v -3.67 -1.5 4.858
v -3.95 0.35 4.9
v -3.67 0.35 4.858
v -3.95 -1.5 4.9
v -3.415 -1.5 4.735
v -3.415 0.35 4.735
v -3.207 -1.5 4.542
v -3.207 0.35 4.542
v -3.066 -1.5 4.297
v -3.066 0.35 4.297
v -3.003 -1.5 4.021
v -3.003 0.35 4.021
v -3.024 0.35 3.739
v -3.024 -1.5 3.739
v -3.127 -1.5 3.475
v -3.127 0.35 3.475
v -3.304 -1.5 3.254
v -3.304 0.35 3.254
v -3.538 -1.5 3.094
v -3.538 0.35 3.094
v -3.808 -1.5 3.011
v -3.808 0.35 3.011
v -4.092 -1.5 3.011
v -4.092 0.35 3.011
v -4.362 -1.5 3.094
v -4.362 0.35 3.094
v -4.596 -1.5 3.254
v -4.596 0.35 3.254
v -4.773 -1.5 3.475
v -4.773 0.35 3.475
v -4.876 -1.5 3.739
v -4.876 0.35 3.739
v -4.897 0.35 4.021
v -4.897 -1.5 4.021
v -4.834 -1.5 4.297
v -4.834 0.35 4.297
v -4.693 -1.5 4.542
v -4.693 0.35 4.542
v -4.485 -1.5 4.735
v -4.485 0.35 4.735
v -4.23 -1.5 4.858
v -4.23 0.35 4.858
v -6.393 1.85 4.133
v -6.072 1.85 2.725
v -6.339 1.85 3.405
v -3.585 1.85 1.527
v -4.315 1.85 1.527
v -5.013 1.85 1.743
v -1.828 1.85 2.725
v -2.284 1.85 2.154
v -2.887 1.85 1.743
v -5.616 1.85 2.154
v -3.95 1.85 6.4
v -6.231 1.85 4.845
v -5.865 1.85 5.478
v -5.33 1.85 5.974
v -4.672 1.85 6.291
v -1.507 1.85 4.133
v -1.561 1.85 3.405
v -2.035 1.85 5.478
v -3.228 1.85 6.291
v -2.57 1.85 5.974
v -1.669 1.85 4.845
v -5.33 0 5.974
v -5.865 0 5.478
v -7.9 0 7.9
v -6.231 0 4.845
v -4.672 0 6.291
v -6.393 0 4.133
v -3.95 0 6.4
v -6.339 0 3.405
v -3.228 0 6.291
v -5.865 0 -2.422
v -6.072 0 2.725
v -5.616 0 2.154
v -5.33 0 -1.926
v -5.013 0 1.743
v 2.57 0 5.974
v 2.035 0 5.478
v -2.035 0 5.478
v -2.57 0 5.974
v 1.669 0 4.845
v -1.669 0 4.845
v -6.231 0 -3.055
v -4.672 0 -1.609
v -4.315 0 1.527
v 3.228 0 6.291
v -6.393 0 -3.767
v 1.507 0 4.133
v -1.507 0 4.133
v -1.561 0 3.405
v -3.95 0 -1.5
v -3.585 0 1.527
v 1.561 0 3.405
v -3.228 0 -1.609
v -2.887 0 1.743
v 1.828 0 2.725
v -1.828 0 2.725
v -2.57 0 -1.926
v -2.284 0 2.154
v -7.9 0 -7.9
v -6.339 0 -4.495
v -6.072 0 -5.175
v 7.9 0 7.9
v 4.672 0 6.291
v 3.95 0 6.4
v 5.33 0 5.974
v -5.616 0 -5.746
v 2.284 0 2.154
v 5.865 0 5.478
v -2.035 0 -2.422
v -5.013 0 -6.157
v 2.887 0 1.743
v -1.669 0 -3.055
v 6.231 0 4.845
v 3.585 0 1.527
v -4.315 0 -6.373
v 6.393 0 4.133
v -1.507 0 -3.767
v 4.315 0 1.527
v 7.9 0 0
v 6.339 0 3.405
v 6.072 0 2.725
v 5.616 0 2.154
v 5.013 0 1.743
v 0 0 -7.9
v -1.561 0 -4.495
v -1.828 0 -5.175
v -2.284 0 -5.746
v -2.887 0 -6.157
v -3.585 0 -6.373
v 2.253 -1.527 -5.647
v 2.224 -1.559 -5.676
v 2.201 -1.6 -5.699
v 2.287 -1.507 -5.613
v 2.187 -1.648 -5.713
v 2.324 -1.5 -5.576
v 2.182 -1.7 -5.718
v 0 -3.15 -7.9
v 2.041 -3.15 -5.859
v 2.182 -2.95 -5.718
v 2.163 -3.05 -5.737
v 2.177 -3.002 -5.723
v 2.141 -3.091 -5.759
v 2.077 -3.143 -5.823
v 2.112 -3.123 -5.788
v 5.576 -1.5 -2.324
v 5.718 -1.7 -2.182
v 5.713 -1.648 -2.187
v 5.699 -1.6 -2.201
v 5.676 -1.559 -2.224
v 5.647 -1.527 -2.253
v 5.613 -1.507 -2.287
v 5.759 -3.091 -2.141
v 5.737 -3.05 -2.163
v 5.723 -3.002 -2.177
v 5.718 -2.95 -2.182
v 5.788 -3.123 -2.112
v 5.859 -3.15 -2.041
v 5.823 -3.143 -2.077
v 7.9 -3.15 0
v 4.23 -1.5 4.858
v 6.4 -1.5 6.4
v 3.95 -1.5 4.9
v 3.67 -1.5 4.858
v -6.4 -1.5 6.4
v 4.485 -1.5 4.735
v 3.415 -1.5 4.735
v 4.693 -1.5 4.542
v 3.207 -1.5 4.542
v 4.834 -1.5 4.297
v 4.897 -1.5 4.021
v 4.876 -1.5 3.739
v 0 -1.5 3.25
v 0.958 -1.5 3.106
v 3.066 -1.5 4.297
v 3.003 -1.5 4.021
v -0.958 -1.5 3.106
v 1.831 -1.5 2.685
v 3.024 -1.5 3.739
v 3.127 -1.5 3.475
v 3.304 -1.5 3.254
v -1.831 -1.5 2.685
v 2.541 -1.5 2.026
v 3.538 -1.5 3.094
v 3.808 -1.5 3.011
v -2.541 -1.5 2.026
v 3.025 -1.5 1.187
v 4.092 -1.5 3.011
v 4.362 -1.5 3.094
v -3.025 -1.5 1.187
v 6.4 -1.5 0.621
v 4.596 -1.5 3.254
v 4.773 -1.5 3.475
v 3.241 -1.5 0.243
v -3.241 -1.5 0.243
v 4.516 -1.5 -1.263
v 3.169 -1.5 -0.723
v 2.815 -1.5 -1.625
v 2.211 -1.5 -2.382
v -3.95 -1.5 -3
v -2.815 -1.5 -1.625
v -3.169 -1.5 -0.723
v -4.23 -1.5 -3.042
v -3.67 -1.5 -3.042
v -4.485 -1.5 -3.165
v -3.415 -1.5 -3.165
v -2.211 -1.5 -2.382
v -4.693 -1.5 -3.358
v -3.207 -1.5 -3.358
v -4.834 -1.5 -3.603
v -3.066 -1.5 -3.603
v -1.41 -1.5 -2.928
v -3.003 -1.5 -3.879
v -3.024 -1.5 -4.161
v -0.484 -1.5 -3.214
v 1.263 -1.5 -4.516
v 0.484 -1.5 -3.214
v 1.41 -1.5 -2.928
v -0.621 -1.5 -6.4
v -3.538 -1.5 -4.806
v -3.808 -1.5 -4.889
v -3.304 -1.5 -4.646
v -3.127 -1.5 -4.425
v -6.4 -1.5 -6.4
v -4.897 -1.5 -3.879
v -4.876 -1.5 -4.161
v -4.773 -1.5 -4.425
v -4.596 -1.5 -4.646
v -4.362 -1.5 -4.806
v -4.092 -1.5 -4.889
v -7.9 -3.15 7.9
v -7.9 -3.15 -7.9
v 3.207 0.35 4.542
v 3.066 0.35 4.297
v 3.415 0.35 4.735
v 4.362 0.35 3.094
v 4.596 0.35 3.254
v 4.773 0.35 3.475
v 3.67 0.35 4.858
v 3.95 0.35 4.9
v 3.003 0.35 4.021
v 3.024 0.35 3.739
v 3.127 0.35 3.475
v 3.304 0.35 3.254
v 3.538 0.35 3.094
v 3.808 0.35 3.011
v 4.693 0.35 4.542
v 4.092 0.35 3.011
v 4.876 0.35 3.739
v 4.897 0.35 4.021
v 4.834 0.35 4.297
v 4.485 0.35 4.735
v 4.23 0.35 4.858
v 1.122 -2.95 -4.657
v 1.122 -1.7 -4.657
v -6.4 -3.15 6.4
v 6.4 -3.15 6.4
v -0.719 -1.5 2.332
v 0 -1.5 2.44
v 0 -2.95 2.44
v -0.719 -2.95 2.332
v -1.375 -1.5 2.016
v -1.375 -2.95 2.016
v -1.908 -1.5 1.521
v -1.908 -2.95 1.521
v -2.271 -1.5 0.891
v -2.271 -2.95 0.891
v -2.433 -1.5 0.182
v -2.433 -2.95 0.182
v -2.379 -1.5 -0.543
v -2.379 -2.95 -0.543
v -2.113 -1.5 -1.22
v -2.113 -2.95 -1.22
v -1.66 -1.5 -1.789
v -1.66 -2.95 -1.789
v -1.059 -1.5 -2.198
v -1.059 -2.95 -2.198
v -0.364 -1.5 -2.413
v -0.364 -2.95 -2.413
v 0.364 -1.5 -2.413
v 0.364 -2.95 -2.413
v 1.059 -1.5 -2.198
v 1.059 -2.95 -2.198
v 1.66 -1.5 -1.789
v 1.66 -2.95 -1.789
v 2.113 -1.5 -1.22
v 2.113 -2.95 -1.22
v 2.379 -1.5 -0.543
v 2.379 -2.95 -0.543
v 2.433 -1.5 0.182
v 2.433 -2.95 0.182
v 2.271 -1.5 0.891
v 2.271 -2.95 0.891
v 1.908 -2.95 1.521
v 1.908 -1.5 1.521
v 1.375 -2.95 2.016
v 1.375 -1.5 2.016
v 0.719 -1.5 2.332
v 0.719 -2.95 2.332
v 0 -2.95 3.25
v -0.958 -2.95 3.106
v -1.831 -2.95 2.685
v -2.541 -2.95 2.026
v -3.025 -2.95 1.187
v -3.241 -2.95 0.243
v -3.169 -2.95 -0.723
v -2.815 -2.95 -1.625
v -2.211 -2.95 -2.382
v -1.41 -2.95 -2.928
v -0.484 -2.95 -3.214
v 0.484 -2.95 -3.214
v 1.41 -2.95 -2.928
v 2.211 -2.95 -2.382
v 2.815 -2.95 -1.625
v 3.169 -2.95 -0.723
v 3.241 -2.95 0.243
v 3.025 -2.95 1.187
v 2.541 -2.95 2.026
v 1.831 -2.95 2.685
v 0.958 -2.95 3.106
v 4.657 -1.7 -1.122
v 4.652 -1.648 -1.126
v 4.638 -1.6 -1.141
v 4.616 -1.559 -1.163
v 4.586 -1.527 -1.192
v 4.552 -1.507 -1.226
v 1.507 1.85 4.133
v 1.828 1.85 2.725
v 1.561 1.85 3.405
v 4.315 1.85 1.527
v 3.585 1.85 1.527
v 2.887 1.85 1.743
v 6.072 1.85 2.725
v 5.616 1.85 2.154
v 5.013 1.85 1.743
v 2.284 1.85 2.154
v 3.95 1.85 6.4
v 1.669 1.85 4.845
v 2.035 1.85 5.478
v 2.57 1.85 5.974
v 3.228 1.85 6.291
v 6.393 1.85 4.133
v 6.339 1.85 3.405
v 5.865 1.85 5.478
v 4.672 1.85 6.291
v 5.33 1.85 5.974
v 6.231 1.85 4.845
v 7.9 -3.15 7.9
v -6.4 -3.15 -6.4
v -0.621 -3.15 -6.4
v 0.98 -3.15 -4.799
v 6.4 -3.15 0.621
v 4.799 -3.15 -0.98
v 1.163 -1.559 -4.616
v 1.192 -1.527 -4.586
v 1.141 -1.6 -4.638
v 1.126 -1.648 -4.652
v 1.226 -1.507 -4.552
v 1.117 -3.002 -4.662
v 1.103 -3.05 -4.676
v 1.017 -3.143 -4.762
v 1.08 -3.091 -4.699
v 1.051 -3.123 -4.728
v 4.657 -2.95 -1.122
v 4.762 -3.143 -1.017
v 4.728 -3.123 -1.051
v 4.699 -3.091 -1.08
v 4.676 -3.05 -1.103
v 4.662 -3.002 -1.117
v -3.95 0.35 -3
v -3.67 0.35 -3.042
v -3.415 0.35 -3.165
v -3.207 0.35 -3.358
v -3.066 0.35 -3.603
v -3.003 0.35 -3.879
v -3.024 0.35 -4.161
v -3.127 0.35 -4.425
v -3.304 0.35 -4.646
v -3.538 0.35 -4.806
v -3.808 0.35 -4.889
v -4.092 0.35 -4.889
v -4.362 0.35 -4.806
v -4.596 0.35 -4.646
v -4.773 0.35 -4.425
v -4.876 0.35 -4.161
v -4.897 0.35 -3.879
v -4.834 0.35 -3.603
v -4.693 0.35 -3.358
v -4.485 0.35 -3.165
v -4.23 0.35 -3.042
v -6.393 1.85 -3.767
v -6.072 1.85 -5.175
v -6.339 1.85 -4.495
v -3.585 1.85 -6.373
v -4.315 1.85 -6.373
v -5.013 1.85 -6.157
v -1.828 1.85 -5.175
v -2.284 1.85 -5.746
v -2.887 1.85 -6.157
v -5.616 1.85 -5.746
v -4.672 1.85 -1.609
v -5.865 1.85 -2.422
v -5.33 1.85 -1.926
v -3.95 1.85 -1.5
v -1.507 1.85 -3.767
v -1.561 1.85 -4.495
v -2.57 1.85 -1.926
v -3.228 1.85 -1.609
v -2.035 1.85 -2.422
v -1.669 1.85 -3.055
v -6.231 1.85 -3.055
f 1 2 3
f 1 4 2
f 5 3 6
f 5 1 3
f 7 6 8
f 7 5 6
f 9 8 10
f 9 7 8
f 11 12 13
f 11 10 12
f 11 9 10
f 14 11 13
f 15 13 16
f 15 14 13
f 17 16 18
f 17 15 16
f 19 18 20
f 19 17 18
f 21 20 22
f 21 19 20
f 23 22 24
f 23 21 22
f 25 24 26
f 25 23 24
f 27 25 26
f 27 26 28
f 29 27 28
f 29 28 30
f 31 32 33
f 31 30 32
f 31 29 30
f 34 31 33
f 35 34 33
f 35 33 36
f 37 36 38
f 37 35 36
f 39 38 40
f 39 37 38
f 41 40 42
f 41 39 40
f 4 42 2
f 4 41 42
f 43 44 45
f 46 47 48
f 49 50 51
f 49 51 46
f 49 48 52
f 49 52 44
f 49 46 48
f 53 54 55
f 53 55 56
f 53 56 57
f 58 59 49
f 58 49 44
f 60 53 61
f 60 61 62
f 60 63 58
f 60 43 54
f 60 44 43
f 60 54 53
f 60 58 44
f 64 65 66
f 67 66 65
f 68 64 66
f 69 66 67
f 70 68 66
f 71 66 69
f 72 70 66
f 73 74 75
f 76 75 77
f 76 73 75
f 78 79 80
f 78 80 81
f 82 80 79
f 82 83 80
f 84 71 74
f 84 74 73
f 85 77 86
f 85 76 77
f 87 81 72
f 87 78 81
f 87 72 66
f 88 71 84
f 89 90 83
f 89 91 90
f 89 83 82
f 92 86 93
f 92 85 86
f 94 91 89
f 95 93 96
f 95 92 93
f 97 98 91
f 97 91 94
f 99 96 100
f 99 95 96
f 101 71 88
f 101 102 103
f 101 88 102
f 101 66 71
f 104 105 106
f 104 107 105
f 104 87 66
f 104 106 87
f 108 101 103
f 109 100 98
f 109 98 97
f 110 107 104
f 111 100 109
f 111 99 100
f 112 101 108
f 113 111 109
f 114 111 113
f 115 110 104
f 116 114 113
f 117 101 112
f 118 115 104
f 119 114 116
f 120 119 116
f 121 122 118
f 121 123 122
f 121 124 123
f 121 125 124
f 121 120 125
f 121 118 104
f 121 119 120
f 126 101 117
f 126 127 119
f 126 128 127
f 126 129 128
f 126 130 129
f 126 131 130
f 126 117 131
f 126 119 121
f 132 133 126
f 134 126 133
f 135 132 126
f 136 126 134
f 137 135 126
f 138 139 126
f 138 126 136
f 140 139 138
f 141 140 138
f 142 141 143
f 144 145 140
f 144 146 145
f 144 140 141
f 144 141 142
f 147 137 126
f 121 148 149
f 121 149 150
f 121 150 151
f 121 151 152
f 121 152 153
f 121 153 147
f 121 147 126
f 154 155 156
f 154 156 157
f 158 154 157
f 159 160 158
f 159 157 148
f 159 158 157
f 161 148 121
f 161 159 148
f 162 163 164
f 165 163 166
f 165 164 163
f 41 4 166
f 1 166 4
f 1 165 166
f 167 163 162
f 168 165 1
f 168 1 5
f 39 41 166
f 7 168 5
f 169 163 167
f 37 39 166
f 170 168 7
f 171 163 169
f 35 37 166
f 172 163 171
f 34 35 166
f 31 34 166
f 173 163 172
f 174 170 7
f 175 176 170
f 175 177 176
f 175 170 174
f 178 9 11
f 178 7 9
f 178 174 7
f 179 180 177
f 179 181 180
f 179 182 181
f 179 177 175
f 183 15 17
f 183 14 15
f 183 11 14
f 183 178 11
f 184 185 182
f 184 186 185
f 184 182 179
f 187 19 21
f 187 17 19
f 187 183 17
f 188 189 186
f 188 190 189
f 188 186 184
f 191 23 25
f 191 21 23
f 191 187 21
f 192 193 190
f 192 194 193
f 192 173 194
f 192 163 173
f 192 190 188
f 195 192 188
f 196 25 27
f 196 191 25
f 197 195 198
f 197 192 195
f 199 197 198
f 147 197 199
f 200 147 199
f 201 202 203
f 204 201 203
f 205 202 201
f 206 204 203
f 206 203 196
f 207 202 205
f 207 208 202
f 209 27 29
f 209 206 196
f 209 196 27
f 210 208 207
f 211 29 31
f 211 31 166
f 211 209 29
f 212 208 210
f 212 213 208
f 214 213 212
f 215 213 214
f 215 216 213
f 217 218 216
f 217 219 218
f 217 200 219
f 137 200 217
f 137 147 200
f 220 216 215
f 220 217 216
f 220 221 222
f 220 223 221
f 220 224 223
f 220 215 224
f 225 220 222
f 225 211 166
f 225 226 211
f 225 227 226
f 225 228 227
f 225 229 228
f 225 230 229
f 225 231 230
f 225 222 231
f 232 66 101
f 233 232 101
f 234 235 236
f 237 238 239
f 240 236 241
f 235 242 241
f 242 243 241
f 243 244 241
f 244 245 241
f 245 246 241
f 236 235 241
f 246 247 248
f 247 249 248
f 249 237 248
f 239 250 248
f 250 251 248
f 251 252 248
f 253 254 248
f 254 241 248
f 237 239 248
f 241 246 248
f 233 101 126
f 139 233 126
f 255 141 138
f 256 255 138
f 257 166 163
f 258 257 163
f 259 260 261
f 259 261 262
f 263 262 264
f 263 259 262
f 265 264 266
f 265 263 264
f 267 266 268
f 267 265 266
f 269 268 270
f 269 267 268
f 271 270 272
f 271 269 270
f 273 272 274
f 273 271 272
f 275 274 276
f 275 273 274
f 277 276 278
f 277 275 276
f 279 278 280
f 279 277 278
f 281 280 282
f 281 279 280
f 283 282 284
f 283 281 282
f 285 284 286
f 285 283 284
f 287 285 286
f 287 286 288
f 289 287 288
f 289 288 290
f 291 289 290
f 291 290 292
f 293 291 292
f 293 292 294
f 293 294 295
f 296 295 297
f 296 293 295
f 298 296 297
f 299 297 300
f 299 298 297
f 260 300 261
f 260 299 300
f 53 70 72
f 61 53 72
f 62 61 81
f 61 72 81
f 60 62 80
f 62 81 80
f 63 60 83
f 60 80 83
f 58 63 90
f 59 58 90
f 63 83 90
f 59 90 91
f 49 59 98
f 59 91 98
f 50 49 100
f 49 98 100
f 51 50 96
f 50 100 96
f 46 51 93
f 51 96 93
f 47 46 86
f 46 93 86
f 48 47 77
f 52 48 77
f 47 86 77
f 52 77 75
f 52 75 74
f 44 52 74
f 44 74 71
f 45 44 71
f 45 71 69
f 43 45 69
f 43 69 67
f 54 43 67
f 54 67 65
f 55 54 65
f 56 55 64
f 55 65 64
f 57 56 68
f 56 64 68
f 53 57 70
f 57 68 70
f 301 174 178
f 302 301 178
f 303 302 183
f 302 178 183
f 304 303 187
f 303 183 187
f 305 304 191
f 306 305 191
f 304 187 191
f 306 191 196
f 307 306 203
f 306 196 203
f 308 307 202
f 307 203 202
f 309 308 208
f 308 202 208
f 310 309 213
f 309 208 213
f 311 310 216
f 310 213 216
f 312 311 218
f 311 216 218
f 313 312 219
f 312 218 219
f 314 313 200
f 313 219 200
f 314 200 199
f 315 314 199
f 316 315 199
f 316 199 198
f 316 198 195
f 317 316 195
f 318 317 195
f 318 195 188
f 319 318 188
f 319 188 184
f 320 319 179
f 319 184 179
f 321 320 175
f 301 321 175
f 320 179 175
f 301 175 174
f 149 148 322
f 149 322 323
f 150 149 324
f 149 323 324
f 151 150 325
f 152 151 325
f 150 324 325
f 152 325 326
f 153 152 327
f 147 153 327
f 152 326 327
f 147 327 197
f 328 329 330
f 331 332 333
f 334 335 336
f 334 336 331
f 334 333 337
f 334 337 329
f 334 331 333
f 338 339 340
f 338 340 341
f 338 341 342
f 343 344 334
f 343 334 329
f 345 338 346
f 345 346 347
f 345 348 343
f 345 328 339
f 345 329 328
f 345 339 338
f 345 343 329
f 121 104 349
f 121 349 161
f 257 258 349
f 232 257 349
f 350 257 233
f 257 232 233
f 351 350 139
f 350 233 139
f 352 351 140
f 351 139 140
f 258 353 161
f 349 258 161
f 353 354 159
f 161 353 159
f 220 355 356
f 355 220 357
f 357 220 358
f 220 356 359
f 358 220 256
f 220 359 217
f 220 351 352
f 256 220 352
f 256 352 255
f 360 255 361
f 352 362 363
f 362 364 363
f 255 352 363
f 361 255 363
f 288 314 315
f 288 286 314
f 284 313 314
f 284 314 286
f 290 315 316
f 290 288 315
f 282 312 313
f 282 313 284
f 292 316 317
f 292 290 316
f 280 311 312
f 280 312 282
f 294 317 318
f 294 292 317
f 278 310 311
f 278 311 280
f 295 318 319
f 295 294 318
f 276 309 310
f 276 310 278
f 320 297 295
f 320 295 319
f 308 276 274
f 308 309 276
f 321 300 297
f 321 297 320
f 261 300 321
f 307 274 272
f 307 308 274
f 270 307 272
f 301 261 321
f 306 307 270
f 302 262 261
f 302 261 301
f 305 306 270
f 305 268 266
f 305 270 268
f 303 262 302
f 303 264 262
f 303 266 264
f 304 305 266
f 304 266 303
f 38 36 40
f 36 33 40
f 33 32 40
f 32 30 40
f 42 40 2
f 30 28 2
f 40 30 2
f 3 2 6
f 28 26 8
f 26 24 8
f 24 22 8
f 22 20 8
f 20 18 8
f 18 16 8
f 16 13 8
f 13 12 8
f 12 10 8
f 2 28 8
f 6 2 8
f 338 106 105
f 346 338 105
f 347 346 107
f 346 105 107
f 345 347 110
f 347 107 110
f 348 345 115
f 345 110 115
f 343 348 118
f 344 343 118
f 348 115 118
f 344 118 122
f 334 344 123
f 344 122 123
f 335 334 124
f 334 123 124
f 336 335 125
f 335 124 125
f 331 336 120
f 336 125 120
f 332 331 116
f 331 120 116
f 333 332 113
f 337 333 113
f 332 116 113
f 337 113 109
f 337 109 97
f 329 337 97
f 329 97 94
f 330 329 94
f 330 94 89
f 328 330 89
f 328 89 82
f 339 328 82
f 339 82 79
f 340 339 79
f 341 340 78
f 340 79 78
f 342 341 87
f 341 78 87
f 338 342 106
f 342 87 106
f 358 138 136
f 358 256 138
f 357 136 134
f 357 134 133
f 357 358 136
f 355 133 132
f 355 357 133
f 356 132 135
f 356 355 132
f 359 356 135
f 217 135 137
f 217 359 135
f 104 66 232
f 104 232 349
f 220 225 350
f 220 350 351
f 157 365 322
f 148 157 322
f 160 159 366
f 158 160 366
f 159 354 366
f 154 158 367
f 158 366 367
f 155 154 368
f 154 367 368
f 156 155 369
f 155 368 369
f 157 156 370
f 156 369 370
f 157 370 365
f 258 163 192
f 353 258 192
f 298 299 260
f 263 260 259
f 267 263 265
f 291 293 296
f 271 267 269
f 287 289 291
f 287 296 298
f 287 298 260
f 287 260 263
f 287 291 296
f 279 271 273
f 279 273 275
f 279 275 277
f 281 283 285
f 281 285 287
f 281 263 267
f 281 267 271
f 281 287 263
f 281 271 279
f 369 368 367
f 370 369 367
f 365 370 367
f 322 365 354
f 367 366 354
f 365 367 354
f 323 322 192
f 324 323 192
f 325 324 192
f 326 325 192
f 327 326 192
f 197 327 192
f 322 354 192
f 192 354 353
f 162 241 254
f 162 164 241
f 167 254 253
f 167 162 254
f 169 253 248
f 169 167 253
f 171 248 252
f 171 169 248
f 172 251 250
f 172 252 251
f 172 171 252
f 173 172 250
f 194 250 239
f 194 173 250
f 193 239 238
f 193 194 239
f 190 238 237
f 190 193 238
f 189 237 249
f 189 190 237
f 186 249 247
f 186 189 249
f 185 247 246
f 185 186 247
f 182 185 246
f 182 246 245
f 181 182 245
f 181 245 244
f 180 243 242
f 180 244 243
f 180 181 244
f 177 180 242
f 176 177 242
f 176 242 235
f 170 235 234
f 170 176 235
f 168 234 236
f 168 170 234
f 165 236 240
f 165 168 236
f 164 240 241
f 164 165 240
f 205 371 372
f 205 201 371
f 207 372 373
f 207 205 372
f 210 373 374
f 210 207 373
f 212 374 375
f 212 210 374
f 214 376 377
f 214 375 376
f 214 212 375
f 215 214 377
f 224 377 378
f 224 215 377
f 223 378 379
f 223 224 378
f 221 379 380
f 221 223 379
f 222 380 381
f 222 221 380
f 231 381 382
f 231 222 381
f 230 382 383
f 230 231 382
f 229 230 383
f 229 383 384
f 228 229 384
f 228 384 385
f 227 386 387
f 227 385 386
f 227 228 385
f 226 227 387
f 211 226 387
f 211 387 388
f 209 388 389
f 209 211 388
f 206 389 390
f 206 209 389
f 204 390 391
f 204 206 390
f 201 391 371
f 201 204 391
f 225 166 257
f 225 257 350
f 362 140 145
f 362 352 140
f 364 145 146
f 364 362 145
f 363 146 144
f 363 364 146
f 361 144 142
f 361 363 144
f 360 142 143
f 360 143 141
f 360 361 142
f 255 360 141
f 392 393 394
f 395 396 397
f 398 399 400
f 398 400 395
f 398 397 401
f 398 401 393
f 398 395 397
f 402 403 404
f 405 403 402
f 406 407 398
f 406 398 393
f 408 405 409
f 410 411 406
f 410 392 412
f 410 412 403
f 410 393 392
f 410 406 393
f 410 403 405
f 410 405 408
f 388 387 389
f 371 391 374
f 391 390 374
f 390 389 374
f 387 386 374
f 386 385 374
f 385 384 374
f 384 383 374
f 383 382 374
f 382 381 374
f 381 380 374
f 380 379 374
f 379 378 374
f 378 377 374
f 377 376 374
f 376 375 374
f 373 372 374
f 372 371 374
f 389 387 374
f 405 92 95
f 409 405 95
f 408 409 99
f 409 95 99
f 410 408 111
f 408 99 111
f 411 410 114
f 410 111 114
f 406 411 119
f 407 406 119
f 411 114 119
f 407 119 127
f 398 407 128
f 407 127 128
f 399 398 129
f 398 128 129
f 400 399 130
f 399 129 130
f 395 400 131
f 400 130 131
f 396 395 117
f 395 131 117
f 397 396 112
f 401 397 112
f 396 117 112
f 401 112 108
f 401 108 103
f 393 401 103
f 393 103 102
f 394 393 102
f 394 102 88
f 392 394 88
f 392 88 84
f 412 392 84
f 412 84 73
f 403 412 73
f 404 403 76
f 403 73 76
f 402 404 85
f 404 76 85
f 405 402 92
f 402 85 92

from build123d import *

# Parameters (mm, degrees)
SKETCH1_W               = 15.8
SKETCH1_H               = 15.8
BOSS_EXTRUDE1_DEPTH     = 3.15
SKETCH2_R               = 2.45
BOSS_EXTRUDE2_DEPTH     = 1.85
CUT_EXTRUDE1_DEPTH      = 12.607863714
CUT_EXTRUDE1_DEPTH_BACK = 12.607863714
SHELL1_T                = -1.5
SKETCH4_W               = 5
SKETCH4_H               = 1.65
CUT_EXTRUDE2_DEPTH      = 1.5
FILLET1_R               = 0.2
SKETCH5_R               = 3.25
SKETCH5_R_2             = 2.44
BOSS_EXTRUDE3_DEPTH     = 1.45


with BuildPart() as part:
    # Sketch1 → Boss-Extrude1 (new body)
    with BuildSketch(Plane(origin=(0, 0, 0), x_dir=(1, 0, 0), z_dir=(0, 1, 0))):
        Rectangle(SKETCH1_W, SKETCH1_H)
    extrude(amount=-BOSS_EXTRUDE1_DEPTH)

    # Sketch2 → Boss-Extrude2 (add)
    with BuildSketch(Plane(origin=(0, 0, 0), x_dir=(1, 0, 0), z_dir=(0, 1, 0))):
        with Locations(Location((-3.95, 3.95, 0), (0, 0, 270))):
            Circle(SKETCH2_R)
        with Locations(Location((-3.95, -3.95, 0), (0, 0, 270))):
            Circle(SKETCH2_R)
        with Locations(Location((3.95, -3.95, 0), (0, 0, 270))):
            Circle(SKETCH2_R)
    extrude(amount=BOSS_EXTRUDE2_DEPTH)

    # Sketch3 → Cut-Extrude1 (cut, two sides: drawn at the far end of the back side and taken through both)
    with BuildSketch(Plane(origin=(0, 0, 0), x_dir=(1, 0, 0), z_dir=(0, 1, 0)).offset(-CUT_EXTRUDE1_DEPTH_BACK)):
        Polygon((0, 7.9), (7.9, 0), (7.9, 7.9), align=None)
    extrude(amount=CUT_EXTRUDE1_DEPTH + CUT_EXTRUDE1_DEPTH_BACK, mode=Mode.SUBTRACT)

    # Shell1
    shell1_openings = [part.faces().sort_by_distance(p)[0] for p in [
        (-0.752380952, -3.15, 0.752380952),
    ]]
    offset(amount=SHELL1_T, openings=shell1_openings, kind=Kind.INTERSECTION)

    # Sketch4 → Cut-Extrude2 (cut)
    with BuildSketch(Plane(origin=(3.95, 0, -3.95), x_dir=(-0.7071067811865475, 0, -0.7071067811865477), z_dir=(0.7071067811865477, 0, -0.7071067811865475))):
        with Locations((0, -2.325)):
            Rectangle(SKETCH4_W, SKETCH4_H)
    extrude(amount=-CUT_EXTRUDE2_DEPTH, mode=Mode.SUBTRACT)

    # Fillet1
    fillet1_edges = [part.edges().sort_by_distance(p)[0] for p in [
        (5.187436867, -3.15, -1.651902961),
        (5.187436867, -1.5, -1.651902961),
        (1.651902961, -1.5, -5.187436867),
        (1.651902961, -3.15, -5.187436867),
    ]]
    fillet(fillet1_edges, radius=FILLET1_R)

    # Sketch5 → Boss-Extrude3 (add)
    with BuildSketch(Plane.XZ.offset(1.5)):
        with Locations(Location((0, 0, 0), (0, 0, 90))):
            Circle(SKETCH5_R)
        with Locations(Location((0, 0, 0), (0, 0, 90))):
            Circle(SKETCH5_R_2, mode=Mode.SUBTRACT)
    extrude(amount=BOSS_EXTRUDE3_DEPTH)


solid = part.part
